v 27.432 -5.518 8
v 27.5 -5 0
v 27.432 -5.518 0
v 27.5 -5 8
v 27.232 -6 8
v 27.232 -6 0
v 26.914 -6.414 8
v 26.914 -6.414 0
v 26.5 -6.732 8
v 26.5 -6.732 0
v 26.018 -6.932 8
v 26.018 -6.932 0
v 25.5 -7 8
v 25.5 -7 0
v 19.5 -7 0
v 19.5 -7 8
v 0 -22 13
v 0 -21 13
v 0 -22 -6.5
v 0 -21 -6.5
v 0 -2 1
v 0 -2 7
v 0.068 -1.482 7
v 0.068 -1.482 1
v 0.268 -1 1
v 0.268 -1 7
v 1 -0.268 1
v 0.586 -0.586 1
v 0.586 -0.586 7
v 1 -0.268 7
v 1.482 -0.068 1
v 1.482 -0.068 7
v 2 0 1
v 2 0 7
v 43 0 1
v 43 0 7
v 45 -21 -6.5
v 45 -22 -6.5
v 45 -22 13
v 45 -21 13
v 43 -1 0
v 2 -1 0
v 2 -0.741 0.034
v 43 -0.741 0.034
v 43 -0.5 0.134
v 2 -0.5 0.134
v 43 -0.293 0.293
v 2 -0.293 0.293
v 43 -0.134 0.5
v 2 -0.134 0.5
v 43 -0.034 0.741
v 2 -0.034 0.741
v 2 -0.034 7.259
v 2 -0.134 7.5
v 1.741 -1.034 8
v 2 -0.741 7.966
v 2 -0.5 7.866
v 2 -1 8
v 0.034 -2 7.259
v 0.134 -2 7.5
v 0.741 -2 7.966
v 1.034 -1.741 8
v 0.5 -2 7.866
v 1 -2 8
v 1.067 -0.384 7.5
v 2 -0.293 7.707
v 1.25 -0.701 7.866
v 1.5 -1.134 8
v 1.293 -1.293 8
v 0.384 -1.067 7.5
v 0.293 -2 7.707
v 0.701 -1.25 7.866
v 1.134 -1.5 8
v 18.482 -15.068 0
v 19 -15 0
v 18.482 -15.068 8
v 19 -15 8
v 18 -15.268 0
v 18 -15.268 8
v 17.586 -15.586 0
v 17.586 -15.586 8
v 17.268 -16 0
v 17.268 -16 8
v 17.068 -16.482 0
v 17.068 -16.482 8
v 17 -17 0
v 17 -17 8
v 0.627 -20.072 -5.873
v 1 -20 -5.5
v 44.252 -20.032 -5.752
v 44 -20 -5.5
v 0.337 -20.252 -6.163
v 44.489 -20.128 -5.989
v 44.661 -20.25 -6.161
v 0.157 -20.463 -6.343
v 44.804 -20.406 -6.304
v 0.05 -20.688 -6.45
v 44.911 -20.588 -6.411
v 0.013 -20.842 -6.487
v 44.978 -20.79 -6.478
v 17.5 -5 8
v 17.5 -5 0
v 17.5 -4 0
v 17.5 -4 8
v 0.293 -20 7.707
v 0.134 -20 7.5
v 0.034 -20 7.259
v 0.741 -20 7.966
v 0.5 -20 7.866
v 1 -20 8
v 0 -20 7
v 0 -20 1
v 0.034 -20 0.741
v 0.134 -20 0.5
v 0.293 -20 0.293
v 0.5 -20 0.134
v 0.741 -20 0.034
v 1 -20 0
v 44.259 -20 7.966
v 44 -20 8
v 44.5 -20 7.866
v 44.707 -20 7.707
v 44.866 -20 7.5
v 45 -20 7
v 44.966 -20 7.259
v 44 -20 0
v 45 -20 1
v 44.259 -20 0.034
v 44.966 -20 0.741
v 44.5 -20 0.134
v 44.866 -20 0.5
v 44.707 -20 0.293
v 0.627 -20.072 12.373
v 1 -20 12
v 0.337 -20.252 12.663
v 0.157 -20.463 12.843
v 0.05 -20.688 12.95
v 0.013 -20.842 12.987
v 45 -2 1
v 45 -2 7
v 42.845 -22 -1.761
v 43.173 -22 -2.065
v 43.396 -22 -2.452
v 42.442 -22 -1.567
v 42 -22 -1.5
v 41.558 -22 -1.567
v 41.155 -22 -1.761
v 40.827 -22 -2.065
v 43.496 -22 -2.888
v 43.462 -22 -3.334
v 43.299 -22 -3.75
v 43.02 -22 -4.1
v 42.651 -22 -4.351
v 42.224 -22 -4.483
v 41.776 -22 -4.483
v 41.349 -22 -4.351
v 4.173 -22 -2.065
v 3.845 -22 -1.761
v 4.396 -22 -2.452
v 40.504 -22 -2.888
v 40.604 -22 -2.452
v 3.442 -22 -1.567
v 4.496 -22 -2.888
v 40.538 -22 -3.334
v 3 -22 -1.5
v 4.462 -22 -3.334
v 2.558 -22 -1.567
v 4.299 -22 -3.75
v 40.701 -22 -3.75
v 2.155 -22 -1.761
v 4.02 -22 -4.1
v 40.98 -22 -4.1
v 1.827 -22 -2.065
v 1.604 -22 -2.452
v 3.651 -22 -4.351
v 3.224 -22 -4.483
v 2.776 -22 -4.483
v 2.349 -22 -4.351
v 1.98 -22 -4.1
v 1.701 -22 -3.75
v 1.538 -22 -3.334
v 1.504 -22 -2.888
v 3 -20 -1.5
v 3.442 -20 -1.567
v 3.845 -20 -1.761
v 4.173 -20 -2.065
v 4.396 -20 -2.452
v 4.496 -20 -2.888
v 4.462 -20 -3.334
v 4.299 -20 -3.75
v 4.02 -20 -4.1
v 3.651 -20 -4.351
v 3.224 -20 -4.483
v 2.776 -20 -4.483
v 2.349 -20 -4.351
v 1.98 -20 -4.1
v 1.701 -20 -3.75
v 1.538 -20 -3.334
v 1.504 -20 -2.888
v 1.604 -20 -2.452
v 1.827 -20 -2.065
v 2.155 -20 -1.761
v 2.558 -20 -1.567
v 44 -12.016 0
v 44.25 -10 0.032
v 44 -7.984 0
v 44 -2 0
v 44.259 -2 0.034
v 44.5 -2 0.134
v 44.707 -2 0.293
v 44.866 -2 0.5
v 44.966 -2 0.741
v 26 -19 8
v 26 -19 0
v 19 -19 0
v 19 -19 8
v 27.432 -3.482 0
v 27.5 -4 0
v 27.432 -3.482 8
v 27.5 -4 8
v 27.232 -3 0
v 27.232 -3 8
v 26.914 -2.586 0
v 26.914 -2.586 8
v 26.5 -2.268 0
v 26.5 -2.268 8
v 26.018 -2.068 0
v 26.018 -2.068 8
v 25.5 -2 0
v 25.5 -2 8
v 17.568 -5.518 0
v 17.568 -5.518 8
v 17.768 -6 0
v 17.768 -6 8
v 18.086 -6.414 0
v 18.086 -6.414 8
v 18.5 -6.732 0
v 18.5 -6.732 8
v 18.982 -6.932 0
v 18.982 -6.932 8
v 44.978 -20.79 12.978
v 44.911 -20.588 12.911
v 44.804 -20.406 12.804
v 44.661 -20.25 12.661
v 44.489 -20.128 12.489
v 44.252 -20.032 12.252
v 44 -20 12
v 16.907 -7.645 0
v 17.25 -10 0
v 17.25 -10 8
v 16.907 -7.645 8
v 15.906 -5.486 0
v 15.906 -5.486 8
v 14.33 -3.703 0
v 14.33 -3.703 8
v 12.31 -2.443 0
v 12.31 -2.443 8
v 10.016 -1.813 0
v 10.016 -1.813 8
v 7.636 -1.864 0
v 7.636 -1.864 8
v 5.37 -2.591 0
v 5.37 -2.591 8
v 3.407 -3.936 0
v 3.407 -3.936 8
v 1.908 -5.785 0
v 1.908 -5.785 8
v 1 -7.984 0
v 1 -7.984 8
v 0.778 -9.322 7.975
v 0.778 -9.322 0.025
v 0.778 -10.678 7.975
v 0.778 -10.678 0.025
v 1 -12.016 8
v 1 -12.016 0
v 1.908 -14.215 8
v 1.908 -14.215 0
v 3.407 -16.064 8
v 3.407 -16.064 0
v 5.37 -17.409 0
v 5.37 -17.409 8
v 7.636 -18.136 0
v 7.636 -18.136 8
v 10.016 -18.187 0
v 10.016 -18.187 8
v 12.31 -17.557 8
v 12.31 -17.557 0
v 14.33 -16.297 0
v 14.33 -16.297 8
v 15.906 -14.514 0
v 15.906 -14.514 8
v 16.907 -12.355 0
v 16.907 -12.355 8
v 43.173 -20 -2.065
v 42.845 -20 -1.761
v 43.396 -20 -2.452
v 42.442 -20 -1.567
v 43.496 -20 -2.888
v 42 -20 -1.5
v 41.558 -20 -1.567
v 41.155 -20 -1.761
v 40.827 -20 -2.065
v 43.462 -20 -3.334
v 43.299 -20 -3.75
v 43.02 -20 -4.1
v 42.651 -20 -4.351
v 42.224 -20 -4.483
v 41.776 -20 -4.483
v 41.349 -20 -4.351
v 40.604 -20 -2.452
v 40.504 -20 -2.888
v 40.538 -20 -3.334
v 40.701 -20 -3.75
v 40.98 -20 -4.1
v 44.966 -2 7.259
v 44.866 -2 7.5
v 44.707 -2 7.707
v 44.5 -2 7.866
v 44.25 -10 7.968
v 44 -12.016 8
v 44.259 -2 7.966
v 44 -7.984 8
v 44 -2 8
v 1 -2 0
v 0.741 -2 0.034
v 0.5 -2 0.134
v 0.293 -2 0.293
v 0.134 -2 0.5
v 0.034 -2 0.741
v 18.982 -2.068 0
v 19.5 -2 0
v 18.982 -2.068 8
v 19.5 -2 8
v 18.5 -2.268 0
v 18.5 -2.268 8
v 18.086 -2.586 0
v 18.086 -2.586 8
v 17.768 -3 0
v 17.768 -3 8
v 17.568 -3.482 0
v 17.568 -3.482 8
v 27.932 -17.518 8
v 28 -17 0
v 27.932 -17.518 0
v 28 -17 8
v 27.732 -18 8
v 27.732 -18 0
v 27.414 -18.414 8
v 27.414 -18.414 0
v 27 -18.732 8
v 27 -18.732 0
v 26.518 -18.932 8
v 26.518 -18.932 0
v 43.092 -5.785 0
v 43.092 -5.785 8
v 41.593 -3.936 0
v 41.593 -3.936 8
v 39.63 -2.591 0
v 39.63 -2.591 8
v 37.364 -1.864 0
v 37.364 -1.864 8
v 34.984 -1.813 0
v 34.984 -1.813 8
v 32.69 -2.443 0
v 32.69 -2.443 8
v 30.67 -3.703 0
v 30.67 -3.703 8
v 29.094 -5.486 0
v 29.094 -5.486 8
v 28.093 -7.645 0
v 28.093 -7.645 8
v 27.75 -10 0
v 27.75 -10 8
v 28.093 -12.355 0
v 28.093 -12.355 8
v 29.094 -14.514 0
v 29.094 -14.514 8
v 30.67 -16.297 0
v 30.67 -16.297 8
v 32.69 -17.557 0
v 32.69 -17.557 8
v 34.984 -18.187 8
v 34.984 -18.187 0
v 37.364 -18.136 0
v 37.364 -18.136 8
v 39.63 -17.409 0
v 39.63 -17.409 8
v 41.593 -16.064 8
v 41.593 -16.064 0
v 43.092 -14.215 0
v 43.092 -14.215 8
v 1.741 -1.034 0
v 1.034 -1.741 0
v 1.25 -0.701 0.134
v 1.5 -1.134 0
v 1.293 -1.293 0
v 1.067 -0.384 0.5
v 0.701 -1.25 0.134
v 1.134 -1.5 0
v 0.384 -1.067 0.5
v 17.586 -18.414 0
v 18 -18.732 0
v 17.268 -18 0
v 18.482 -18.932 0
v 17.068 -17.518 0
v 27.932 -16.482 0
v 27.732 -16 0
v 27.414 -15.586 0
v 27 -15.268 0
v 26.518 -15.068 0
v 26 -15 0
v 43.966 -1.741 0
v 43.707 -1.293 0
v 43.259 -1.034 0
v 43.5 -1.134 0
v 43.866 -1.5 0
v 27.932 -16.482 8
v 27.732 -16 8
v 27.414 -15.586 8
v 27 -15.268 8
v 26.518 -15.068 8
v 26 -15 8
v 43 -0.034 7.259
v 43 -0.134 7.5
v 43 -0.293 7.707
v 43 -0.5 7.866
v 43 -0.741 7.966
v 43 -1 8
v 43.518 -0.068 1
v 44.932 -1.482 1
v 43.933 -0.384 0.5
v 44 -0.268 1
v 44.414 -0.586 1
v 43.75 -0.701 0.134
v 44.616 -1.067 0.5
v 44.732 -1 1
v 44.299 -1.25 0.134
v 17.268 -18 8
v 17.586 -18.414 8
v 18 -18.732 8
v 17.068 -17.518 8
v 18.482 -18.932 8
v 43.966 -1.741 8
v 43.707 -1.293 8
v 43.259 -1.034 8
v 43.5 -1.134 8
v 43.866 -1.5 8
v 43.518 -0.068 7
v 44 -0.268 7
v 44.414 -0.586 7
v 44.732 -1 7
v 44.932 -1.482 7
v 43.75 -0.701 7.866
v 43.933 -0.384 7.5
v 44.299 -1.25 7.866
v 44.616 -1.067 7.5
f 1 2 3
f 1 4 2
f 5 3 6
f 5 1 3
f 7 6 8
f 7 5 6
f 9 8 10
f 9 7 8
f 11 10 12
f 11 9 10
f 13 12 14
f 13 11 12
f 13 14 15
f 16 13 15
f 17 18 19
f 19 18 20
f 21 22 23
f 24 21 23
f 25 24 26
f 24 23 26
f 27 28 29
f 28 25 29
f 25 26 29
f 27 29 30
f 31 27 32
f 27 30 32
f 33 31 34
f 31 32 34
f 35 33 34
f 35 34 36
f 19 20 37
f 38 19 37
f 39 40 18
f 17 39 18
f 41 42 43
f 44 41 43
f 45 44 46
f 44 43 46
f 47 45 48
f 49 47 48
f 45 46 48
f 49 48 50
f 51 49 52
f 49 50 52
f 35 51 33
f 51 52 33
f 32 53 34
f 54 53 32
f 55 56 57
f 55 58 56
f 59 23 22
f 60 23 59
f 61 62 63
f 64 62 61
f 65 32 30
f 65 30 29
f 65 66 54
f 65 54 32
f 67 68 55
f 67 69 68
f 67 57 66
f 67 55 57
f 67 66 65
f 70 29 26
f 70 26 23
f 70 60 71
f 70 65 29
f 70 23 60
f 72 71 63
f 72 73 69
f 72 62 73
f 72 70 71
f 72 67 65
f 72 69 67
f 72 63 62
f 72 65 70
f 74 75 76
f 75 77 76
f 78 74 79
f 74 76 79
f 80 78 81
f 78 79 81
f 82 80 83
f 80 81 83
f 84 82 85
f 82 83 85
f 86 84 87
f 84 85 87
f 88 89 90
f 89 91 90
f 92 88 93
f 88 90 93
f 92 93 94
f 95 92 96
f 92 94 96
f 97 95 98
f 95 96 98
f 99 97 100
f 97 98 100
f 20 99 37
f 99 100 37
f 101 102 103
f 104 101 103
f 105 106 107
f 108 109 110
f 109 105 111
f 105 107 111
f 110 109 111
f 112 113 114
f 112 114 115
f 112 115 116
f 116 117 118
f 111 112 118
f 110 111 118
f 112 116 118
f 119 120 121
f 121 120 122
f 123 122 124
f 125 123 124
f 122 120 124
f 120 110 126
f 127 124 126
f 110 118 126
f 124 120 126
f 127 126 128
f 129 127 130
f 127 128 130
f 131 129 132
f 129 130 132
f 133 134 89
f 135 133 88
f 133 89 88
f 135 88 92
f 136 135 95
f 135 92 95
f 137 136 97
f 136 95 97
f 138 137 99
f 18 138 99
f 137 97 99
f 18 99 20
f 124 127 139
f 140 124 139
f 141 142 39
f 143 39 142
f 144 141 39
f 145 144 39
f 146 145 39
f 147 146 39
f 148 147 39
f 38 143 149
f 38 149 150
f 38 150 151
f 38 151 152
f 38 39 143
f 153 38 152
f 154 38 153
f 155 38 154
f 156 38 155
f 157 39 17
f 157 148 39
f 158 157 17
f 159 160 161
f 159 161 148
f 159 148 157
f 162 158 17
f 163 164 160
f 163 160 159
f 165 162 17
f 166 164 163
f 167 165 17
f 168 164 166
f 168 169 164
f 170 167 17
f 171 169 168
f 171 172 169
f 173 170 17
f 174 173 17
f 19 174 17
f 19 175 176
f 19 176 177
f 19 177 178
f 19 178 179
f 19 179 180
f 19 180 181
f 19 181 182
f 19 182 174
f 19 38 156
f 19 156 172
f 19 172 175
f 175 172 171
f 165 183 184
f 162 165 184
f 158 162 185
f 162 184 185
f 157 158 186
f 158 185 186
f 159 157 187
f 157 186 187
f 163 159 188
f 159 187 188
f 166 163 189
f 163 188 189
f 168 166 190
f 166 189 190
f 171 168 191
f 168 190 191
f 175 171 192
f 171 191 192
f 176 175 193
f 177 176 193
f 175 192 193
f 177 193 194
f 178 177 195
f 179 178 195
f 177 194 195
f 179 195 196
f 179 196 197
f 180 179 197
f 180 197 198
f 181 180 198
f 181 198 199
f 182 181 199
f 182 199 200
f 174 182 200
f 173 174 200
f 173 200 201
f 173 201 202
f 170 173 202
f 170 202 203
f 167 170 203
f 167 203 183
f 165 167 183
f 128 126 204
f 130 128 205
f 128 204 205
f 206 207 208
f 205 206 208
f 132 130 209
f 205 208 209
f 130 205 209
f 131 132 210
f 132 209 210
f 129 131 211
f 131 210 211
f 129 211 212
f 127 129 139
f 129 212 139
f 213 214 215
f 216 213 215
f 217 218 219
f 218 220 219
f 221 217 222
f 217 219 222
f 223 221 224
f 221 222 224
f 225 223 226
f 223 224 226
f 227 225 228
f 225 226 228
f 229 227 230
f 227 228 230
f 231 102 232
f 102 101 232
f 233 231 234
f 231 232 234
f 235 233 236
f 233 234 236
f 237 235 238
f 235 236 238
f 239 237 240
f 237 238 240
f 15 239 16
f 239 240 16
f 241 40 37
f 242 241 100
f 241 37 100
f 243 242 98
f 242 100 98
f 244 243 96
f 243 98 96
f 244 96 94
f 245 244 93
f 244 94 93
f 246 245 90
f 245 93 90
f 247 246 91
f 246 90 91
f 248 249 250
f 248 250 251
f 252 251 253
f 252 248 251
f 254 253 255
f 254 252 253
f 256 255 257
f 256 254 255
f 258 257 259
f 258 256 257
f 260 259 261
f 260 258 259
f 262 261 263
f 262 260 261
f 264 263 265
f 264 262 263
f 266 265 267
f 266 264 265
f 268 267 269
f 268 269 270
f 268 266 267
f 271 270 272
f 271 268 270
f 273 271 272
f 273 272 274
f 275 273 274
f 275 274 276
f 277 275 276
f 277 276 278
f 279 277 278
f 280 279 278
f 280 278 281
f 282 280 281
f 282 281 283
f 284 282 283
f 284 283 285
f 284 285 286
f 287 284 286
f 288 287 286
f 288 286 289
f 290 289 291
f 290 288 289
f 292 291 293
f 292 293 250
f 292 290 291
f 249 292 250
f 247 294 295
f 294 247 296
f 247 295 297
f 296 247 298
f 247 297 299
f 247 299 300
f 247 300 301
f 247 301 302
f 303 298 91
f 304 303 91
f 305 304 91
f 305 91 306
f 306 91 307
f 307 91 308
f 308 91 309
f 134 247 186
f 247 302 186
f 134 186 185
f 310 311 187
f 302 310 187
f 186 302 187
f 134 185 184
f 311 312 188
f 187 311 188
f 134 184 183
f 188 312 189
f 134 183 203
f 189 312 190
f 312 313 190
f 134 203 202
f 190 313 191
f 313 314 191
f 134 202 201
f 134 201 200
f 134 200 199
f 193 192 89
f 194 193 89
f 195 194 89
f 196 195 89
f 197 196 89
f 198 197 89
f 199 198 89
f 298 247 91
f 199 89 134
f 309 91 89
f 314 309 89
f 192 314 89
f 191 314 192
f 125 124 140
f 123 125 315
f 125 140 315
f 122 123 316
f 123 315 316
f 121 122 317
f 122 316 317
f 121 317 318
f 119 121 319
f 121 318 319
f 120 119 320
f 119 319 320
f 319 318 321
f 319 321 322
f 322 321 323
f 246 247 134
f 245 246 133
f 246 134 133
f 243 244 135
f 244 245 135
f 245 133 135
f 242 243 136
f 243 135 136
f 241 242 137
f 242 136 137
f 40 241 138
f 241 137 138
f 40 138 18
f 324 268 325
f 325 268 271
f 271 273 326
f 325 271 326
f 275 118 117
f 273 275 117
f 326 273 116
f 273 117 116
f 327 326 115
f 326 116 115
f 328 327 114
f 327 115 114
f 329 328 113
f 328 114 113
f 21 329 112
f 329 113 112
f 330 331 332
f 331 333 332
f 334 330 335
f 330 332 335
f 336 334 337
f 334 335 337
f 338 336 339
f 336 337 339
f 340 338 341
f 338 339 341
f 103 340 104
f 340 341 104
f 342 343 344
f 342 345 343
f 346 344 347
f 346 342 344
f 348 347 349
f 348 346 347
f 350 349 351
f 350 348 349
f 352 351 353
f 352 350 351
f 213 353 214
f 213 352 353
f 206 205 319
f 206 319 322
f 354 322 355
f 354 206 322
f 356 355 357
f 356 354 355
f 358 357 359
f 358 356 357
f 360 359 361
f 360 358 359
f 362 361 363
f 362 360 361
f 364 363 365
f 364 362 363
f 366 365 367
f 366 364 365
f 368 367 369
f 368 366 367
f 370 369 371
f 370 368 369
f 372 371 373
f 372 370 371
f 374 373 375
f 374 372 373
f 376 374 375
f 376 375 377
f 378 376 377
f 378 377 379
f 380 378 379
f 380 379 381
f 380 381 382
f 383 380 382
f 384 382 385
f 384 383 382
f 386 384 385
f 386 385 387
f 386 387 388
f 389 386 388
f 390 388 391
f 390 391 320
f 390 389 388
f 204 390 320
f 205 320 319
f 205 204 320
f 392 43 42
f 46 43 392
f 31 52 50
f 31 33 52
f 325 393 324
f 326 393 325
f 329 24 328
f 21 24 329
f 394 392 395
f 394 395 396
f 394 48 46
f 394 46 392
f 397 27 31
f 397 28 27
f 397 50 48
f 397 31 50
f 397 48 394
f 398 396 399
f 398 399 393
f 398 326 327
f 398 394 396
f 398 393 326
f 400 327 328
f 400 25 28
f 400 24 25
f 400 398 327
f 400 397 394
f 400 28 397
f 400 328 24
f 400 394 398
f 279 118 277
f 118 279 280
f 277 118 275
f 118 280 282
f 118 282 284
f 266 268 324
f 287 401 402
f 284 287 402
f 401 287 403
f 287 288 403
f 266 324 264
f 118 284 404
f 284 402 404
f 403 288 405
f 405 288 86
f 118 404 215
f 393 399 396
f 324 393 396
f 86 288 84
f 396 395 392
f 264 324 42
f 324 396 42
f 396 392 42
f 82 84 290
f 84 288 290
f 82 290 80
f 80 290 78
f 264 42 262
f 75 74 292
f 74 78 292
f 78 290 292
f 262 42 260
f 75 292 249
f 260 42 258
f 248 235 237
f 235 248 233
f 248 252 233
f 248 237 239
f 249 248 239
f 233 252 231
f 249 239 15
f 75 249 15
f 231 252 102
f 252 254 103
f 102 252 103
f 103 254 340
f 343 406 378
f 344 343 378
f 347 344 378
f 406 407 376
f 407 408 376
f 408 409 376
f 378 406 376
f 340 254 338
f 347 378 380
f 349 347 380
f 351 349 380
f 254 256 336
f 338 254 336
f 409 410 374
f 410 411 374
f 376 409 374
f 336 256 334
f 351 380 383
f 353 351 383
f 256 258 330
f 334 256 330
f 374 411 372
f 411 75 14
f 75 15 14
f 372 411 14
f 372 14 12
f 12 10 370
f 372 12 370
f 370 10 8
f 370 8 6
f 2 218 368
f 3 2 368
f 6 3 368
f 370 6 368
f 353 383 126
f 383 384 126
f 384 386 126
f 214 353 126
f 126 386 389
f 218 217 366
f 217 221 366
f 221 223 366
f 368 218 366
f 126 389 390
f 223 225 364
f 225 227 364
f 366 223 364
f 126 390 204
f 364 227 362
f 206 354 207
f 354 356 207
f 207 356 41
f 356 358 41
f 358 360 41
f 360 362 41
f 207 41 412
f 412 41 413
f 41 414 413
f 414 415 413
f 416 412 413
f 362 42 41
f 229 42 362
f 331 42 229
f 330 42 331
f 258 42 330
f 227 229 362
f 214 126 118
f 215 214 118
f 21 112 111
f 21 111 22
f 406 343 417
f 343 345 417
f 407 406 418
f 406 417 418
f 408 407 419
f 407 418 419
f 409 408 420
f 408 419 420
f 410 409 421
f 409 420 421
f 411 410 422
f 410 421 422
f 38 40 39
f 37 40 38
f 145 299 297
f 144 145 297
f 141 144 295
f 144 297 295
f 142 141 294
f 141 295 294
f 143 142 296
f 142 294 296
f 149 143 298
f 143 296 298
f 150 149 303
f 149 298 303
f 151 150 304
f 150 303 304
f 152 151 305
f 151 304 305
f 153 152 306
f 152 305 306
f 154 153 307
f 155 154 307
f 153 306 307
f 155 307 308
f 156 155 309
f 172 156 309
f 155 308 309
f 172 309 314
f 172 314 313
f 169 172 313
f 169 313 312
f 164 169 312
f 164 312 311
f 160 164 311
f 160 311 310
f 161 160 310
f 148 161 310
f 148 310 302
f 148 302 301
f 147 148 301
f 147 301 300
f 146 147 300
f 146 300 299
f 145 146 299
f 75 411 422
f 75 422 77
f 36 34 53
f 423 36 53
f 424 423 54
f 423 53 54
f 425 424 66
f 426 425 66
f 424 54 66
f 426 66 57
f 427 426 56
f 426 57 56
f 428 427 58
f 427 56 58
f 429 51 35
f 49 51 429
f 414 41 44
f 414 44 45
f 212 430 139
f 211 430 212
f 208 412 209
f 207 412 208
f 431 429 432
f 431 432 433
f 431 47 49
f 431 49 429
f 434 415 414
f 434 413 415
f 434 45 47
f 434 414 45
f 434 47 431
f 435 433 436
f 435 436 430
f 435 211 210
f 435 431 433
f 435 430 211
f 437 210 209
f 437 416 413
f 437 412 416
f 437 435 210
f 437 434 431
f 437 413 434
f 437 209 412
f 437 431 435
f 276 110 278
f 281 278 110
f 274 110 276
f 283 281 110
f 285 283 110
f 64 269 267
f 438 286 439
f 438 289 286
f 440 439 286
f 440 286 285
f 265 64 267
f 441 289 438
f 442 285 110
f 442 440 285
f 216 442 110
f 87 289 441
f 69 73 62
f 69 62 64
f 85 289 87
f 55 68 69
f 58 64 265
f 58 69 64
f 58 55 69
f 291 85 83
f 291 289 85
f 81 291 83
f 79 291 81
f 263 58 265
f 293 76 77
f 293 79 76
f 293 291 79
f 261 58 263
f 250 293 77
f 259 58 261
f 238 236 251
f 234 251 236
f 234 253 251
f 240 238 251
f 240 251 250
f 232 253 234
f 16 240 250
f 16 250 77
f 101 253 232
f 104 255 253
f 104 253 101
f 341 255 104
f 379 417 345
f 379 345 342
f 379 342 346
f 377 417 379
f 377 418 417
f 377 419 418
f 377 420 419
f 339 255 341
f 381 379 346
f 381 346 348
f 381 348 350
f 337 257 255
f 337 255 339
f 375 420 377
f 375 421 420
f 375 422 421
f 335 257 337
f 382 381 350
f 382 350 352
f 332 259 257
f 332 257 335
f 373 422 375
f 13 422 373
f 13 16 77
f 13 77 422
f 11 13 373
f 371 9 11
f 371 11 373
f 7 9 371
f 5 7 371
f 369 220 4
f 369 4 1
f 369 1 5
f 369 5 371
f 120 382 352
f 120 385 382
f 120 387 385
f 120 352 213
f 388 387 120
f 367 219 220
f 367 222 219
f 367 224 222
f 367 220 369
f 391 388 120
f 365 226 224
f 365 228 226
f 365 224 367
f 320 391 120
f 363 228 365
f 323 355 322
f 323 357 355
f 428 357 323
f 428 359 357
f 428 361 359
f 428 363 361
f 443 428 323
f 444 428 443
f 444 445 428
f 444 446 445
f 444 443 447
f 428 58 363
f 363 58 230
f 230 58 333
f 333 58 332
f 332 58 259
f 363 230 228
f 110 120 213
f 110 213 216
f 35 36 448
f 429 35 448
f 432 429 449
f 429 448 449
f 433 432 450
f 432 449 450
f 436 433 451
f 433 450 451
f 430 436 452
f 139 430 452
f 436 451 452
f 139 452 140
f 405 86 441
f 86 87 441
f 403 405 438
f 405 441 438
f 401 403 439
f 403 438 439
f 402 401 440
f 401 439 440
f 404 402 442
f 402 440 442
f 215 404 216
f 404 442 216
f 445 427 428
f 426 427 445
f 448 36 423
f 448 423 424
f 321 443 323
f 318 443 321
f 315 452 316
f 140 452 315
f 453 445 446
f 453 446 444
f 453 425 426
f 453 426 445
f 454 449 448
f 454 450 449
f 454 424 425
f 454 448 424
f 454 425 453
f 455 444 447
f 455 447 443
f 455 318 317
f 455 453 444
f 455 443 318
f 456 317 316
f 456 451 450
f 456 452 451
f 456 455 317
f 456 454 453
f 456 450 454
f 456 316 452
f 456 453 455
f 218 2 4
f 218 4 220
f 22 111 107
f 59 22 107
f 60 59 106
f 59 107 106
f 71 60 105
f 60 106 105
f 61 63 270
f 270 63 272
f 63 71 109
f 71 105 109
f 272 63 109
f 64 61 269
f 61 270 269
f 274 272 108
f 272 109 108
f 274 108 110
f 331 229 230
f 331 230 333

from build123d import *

# Parameters (mm, degrees)
CROQUIS1_W              = 45
CROQUIS1_H              = 20
CROQUIS1_R              = 8.25
SALIENTE_EXTRUIR1_DEPTH = 8
CROQUIS2_W              = 45
CROQUIS2_H              = 23
SALIENTE_EXTRUIR2_DEPTH = 2
CROQUIS4_W              = 11
CROQUIS4_H              = 4
CROQUIS4_W_2            = 10
CROQUIS4_H_2            = 5
CORTAR_EXTRUIR3_DEPTH   = 52.749396132
CROQUIS5_R              = 1.5
CORTAR_EXTRUIR4_DEPTH   = 51.931326313
REDONDEO1_R             = 2
REDONDEO2_R             = 2
REDONDEO3_R             = 1
CROQUIS6_W              = 45
CROQUIS6_H              = 3.5
CORTAR_EXTRUIR5_DEPTH   = 51.931326401
REDONDEO4_R             = 1


# Some blends are built 0.0001 mm under size
with BuildPart() as part:
    # Croquis1 → Saliente-Extruir1 (new body)
    with BuildSketch(Plane.XY):
        with Locations((22.5, -10)):
            Rectangle(CROQUIS1_W, CROQUIS1_H)
        with Locations((9, -10)):
            Circle(CROQUIS1_R, mode=Mode.SUBTRACT)
        with Locations((36, -10)):
            Circle(CROQUIS1_R, mode=Mode.SUBTRACT)
    extrude(amount=SALIENTE_EXTRUIR1_DEPTH)

    # Croquis4 → Cortar-Extruir3 (cut, through all)
    with BuildSketch(Plane(origin=(0, 0, 0), x_dir=(-1, 0, 0), z_dir=(0, 0, -1))):
        with Locations((-22.5, -17)):
            Rectangle(CROQUIS4_W, CROQUIS4_H)
        with Locations((-22.5, -4.5)):
            Rectangle(CROQUIS4_W_2, CROQUIS4_H_2)
    extrude(amount=-CORTAR_EXTRUIR3_DEPTH, mode=Mode.SUBTRACT)

    # Redondeo1
    redondeo1_edges = [part.edges().sort_by_distance(p)[0] for p in [
        (17, -19, 4),
        (28, -15, 4),
        (17, -15, 4),
        (28, -19, 4),
    ]]
    fillet(redondeo1_edges, radius=REDONDEO1_R - 0.0001)  # a hair under: the kernel refuses the full size

    # Redondeo2
    redondeo2_edges = [part.edges().sort_by_distance(p)[0] for p in [
        (17.5, -7, 4),
        (27.5, -7, 4),
        (27.5, -2, 4),
        (17.5, -2, 4),
        (0, 0, 4),
        (45, 0, 4),
    ]]
    fillet(redondeo2_edges, radius=REDONDEO2_R)

    # Redondeo3
    # the kernel refuses this fillet: 1 mm, written as the material it takes off along each edge
    with BuildSketch(Plane(origin=(45, -2, 8), x_dir=(0, 0, -1), z_dir=(0, -1, 0)), Plane(origin=(45, -2, 0), x_dir=(-1, 0, 0), z_dir=(0, -1, 0)), Plane(origin=(0, -22.5, 0), x_dir=(1, 0, 0), z_dir=(0, 1, 0)), Plane(origin=(0, -22.5, 8), x_dir=(0, 0, -1), z_dir=(0, 1, 0))) as redondeo3_piece_1:
        with BuildLine():
            CenterArc((REDONDEO3_R, -REDONDEO3_R), REDONDEO3_R, 90, 90)
            Line((0, -REDONDEO3_R), (0, 0))
            Line((0, 0), (REDONDEO3_R, 0))
        make_face()
    extrude(amount=20.5, mode=Mode.SUBTRACT)
    with BuildSketch(Plane(origin=(2, 0, 0), x_dir=(0, -1, 0), z_dir=(1, 0, 0)), Plane(origin=(2, 0, 8), x_dir=(0, 0, -1), z_dir=(1, 0, 0))) as redondeo3_piece_2:
        with BuildLine():
            CenterArc((REDONDEO3_R, -REDONDEO3_R), REDONDEO3_R, 90, 90)
            Line((0, -REDONDEO3_R), (0, 0))
            Line((0, 0), (REDONDEO3_R, 0))
        make_face()
    extrude(amount=41, mode=Mode.SUBTRACT)
    with BuildSketch(Plane(origin=(2, -2, 0), x_dir=(0, 1, 0), z_dir=(1, 0, 0))) as redondeo3_piece_3:
        with BuildLine():
            CenterArc((2 - REDONDEO3_R, REDONDEO3_R), REDONDEO3_R, 270, 90)
            Line((2, REDONDEO3_R), (2, 0))
            Line((2, 0), (2 - REDONDEO3_R, 0))
        make_face()
    revolve(axis=Axis((2, -2, 0), (0, 0, 1)), revolution_arc=90, mode=Mode.SUBTRACT)
    with BuildSketch(Plane(origin=(43, -2, 0), x_dir=(0, 1, 0), z_dir=(-1, 0, 0))) as redondeo3_piece_4:
        with BuildLine():
            CenterArc((2 - REDONDEO3_R, -REDONDEO3_R), REDONDEO3_R, 0, 90)
            Line((2, -REDONDEO3_R), (2, 0))
            Line((2, 0), (2 - REDONDEO3_R, 0))
        make_face()
    revolve(axis=Axis((43, -2, 0), (0, 0, -1)), revolution_arc=90, mode=Mode.SUBTRACT)
    with BuildSketch(Plane(origin=(2, -2, 8), x_dir=(0, 1, 0), z_dir=(1, 0, 0))) as redondeo3_piece_5:
        with BuildLine():
            CenterArc((2 - REDONDEO3_R, -REDONDEO3_R), REDONDEO3_R, 0, 90)
            Line((2 - REDONDEO3_R, 0), (2, 0))
            Line((2, 0), (2, -REDONDEO3_R))
        make_face()
    revolve(axis=Axis((2, -2, 8), (0, 0, 1)), revolution_arc=90, mode=Mode.SUBTRACT)
    with BuildSketch(Plane(origin=(43, -2, 8), x_dir=(0, 1, 0), z_dir=(-1, 0, 0))) as redondeo3_piece_6:
        with BuildLine():
            CenterArc((2 - REDONDEO3_R, REDONDEO3_R), REDONDEO3_R, 270, 90)
            Line((2 - REDONDEO3_R, 0), (2, 0))
            Line((2, 0), (2, REDONDEO3_R))
        make_face()
    revolve(axis=Axis((43, -2, 8), (0, 0, -1)), revolution_arc=90, mode=Mode.SUBTRACT)


with BuildPart() as body_2:
    # Croquis2 → Saliente-Extruir2 (new body)
    with BuildSketch(Plane(origin=(0, -20, 0), x_dir=(-1, 0, 0), z_dir=(0, -1, 0))):
        with Locations((-22.5, -1.5)):
            Rectangle(CROQUIS2_W, CROQUIS2_H)
    extrude(amount=SALIENTE_EXTRUIR2_DEPTH)

    # Croquis5 → Cortar-Extruir4 (cut, through all)
    with BuildSketch(Plane(origin=(0, -20, 0), x_dir=(1, 0, 0), z_dir=(0, 1, 0))):
        with Locations(Location((3, 3, 0), (0, 0, 270))):
            Circle(CROQUIS5_R)
        with Locations(Location((42, 3, 0), (0, 0, 270))):
            Circle(CROQUIS5_R)
    extrude(amount=-CORTAR_EXTRUIR4_DEPTH, mode=Mode.SUBTRACT)

    # Croquis6 → Cortar-Extruir5 (cut, through all)
    with BuildSketch(Plane(origin=(0, -20, 0), x_dir=(1, 0, 0), z_dir=(0, 1, 0))):
        with Locations((22.5, 8.25)):
            Rectangle(CROQUIS6_W, CROQUIS6_H)
    extrude(amount=-CORTAR_EXTRUIR5_DEPTH, mode=Mode.SUBTRACT)

    # Redondeo4
    redondeo4_edges = [body_2.edges().sort_by_distance(p)[0] for p in [
        (45, -20, 3.25),
        (22.5, -20, -6.5),
        (0, -20, 3.25),
        (22.5, -20, 13),
    ]]
    fillet(redondeo4_edges, radius=REDONDEO4_R)


solid = Compound([part.part, body_2.part])
